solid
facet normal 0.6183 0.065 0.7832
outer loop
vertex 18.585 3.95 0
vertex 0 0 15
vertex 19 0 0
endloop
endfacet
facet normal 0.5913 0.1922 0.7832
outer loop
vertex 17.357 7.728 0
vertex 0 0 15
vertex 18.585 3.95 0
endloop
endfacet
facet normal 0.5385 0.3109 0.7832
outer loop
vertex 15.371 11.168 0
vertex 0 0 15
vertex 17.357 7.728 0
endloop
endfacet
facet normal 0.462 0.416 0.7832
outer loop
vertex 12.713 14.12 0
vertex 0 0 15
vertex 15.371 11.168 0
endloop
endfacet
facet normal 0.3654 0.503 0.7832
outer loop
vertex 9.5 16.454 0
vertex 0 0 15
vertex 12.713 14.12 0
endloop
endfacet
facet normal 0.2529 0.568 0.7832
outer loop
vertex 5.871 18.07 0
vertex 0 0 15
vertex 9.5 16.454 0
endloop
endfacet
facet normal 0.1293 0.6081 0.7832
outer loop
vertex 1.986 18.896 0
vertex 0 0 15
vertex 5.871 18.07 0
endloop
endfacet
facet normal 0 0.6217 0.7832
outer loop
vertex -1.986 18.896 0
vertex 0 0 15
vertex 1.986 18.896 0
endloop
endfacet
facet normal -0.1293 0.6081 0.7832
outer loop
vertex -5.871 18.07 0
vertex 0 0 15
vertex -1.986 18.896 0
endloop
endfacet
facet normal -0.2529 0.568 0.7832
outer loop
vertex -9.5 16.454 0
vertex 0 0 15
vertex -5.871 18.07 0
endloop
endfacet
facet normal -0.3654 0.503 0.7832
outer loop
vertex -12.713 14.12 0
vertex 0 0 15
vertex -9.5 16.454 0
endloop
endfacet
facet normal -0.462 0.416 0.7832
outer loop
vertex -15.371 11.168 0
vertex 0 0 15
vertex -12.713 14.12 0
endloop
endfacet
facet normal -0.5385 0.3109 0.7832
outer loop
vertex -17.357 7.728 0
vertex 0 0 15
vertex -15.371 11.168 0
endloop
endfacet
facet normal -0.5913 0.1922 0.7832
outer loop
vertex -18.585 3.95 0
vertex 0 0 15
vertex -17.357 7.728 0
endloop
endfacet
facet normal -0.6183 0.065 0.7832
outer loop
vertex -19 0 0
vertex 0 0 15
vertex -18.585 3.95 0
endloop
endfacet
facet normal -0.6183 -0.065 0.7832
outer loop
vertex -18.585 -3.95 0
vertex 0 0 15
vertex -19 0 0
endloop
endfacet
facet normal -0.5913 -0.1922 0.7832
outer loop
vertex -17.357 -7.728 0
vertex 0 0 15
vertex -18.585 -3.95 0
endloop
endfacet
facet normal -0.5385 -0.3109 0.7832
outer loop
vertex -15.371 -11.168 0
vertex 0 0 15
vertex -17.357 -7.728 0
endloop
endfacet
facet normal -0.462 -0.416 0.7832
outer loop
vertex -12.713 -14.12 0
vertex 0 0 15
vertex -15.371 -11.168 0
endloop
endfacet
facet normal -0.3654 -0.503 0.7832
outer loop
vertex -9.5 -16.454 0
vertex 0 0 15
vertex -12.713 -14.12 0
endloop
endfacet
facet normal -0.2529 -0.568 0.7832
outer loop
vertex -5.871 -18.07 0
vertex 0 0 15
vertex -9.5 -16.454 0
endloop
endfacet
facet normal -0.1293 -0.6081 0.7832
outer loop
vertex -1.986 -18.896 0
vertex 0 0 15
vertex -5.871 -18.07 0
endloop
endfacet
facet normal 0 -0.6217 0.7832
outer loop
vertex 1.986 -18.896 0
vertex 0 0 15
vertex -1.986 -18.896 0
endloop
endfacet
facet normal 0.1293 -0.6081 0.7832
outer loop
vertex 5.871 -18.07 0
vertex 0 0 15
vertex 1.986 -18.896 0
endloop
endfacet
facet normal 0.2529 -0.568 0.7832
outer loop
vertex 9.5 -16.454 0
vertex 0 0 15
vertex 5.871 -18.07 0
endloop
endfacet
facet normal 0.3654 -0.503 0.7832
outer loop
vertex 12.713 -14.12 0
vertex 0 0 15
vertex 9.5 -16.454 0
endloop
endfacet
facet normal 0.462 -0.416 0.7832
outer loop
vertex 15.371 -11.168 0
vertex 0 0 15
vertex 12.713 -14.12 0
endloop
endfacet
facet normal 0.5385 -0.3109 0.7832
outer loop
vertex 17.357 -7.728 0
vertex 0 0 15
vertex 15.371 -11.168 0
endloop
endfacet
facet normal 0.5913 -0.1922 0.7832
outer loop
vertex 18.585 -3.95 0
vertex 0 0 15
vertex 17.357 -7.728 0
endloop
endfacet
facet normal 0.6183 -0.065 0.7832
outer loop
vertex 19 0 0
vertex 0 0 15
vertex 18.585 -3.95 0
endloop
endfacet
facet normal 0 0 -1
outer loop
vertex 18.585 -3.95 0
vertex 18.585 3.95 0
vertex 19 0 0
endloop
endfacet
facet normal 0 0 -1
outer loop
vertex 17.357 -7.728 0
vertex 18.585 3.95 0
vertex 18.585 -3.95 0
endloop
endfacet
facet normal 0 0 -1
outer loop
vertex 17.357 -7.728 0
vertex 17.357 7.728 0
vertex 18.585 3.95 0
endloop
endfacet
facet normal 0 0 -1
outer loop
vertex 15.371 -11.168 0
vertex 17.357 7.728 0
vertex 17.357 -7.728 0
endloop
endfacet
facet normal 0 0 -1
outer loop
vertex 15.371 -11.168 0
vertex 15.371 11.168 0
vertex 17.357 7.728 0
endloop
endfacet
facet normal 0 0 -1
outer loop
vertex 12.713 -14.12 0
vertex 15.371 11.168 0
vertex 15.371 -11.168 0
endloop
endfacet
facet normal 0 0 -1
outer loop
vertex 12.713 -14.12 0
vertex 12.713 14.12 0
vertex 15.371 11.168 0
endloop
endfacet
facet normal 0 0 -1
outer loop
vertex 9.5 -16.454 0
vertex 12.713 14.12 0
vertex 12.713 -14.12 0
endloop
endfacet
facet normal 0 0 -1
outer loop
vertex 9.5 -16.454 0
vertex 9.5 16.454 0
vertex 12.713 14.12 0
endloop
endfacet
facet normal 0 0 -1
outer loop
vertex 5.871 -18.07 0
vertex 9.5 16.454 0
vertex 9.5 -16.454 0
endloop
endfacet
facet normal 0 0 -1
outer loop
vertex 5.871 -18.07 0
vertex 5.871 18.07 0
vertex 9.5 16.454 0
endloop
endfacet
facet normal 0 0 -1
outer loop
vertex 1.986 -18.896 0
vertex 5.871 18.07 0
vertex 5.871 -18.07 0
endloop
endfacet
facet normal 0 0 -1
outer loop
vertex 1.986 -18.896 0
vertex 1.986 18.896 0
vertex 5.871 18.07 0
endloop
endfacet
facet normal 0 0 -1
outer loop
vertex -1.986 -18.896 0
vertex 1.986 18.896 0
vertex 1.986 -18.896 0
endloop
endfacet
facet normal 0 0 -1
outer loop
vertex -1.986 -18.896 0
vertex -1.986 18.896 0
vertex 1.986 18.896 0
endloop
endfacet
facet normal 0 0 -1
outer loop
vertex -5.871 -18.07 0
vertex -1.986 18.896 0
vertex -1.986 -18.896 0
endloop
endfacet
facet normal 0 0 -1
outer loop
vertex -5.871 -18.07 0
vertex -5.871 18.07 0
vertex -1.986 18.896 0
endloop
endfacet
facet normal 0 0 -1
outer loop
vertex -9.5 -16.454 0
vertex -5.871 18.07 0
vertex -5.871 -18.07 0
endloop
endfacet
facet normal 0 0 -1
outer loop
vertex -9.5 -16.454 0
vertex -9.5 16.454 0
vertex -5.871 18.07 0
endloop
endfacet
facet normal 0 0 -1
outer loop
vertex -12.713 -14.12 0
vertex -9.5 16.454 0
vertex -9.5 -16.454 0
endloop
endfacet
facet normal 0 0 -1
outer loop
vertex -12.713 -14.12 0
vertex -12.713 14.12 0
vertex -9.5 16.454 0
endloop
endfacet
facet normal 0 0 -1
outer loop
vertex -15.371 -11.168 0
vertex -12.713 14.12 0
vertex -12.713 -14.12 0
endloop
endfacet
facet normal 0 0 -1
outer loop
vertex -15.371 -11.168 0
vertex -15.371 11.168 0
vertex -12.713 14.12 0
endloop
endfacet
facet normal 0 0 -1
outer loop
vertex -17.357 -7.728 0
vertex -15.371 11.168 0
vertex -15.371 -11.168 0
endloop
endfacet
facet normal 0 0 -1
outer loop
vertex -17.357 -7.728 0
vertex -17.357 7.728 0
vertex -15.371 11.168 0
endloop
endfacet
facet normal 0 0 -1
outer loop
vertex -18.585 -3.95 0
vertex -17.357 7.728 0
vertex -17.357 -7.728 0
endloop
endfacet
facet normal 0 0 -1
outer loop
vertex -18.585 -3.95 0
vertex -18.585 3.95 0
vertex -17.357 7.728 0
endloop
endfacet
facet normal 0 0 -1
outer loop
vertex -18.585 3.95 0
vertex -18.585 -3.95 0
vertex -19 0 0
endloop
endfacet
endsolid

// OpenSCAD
// Generated by SolidPython 1.0.1 on 2020-07-29 00:46:43


cylinder(h = 15, r1 = 19, r2 = 0);
/***********************************************
*********      SolidPython code:      **********
************************************************
 
# import packages: SolidPython
from solid import *
from solid.utils import *
from itertools import chain, combinations, permutations


class Resize:

    def __init__(self, scad_file):
        self.scad_file = scad_file
        #self.scad_file = import_scad(scad_file)
        # cone/cylinder param:
        self.r1 = 0
        self.r2 = 0
        self.h = 0
        # rectangular prism param:
        self.w = 0
        self.l = 0
        # ellipse param:
        self.r = 0

    # import OpenScad code (file name corresponds to shape)


    # classify shape + parameters
    def assign(self, param1, param2, param3):
        if self.scad_file == 'cone.scad':
            self.r1 = param1
            self.r2 = param2
            self.h = param3
        elif self.scad_file == 'cylinder.scad':
            self.r1 = param1
            self.r2 = param2
            self.h = param3
        elif self.scad_file == 'rectangularPrism.scad':
            self.h = param1
            self.l = param2
            self.w = param3
        else:
            self.r = param1
            self.h = param2

    # resize parameters
    def iterate(self):
        x = range(3, 20, 2)
        i = 1
        if self.scad_file == 'cone.scad':
            tempList = list(permutations(x, 2))
            for temp in tempList:
                param1 = temp[0]
                param2 = temp[1]
                filepath = 'produced_scad_files/' + 'cone' + str(param1) + '_' + str(param2) + '_' + '.scad'
                scad_render_to_file(cylinder(h=param1, r1=param2, r2=0), filepath)

        elif self.scad_file == 'cylinder.scad':
            tempList = list(permutations(x, 3))
            for temp in tempList:
                param1 = temp[0]
                param2 = temp[1]
                filepath = 'produced_scad_files/' + 'cylinder' + str(param1) + '_' + str(param2) + '_' + '.scad'
                scad_render_to_file(cylinder(h=param1, r1=param2, r2=param2), filepath)

        elif self.scad_file == 'rectangularPrism.scad':
            tempList = list(permutations(x, 3))
            for temp in tempList:
                param1 = temp[0]
                param2 = temp[1]
                param3 = temp[2]
                filepath = 'produced_scad_files/' + 'rectangularPrism' + str(param1) + '_' + str(param2) + '_' + str(
                    param3) + '.scad'
                scad_render_to_file(cube(size=(param1, param2, param3)), filepath)

        elif self.scad_file == 'ellipse.scad':
            tempList = list(permutations(x, 4))
            for temp in tempList:
                param1 = temp[0]
                param2 = temp[1]
                param3 = temp[2]
                param4 = temp[3]
                filepath = 'produced_scad_files/' + 'ellipse' + str(param1) + '_' + str(param2) + '_' + str(param3) + '_' + str(param4) + '.scad'
                scad_render_to_file(scale([param1, param2, param3])(sphere(r=param4)), filepath)

    def render_to_scadfile(self):
        scad_render_to_file(scad, 'example.scad') 
 
************************************************/
